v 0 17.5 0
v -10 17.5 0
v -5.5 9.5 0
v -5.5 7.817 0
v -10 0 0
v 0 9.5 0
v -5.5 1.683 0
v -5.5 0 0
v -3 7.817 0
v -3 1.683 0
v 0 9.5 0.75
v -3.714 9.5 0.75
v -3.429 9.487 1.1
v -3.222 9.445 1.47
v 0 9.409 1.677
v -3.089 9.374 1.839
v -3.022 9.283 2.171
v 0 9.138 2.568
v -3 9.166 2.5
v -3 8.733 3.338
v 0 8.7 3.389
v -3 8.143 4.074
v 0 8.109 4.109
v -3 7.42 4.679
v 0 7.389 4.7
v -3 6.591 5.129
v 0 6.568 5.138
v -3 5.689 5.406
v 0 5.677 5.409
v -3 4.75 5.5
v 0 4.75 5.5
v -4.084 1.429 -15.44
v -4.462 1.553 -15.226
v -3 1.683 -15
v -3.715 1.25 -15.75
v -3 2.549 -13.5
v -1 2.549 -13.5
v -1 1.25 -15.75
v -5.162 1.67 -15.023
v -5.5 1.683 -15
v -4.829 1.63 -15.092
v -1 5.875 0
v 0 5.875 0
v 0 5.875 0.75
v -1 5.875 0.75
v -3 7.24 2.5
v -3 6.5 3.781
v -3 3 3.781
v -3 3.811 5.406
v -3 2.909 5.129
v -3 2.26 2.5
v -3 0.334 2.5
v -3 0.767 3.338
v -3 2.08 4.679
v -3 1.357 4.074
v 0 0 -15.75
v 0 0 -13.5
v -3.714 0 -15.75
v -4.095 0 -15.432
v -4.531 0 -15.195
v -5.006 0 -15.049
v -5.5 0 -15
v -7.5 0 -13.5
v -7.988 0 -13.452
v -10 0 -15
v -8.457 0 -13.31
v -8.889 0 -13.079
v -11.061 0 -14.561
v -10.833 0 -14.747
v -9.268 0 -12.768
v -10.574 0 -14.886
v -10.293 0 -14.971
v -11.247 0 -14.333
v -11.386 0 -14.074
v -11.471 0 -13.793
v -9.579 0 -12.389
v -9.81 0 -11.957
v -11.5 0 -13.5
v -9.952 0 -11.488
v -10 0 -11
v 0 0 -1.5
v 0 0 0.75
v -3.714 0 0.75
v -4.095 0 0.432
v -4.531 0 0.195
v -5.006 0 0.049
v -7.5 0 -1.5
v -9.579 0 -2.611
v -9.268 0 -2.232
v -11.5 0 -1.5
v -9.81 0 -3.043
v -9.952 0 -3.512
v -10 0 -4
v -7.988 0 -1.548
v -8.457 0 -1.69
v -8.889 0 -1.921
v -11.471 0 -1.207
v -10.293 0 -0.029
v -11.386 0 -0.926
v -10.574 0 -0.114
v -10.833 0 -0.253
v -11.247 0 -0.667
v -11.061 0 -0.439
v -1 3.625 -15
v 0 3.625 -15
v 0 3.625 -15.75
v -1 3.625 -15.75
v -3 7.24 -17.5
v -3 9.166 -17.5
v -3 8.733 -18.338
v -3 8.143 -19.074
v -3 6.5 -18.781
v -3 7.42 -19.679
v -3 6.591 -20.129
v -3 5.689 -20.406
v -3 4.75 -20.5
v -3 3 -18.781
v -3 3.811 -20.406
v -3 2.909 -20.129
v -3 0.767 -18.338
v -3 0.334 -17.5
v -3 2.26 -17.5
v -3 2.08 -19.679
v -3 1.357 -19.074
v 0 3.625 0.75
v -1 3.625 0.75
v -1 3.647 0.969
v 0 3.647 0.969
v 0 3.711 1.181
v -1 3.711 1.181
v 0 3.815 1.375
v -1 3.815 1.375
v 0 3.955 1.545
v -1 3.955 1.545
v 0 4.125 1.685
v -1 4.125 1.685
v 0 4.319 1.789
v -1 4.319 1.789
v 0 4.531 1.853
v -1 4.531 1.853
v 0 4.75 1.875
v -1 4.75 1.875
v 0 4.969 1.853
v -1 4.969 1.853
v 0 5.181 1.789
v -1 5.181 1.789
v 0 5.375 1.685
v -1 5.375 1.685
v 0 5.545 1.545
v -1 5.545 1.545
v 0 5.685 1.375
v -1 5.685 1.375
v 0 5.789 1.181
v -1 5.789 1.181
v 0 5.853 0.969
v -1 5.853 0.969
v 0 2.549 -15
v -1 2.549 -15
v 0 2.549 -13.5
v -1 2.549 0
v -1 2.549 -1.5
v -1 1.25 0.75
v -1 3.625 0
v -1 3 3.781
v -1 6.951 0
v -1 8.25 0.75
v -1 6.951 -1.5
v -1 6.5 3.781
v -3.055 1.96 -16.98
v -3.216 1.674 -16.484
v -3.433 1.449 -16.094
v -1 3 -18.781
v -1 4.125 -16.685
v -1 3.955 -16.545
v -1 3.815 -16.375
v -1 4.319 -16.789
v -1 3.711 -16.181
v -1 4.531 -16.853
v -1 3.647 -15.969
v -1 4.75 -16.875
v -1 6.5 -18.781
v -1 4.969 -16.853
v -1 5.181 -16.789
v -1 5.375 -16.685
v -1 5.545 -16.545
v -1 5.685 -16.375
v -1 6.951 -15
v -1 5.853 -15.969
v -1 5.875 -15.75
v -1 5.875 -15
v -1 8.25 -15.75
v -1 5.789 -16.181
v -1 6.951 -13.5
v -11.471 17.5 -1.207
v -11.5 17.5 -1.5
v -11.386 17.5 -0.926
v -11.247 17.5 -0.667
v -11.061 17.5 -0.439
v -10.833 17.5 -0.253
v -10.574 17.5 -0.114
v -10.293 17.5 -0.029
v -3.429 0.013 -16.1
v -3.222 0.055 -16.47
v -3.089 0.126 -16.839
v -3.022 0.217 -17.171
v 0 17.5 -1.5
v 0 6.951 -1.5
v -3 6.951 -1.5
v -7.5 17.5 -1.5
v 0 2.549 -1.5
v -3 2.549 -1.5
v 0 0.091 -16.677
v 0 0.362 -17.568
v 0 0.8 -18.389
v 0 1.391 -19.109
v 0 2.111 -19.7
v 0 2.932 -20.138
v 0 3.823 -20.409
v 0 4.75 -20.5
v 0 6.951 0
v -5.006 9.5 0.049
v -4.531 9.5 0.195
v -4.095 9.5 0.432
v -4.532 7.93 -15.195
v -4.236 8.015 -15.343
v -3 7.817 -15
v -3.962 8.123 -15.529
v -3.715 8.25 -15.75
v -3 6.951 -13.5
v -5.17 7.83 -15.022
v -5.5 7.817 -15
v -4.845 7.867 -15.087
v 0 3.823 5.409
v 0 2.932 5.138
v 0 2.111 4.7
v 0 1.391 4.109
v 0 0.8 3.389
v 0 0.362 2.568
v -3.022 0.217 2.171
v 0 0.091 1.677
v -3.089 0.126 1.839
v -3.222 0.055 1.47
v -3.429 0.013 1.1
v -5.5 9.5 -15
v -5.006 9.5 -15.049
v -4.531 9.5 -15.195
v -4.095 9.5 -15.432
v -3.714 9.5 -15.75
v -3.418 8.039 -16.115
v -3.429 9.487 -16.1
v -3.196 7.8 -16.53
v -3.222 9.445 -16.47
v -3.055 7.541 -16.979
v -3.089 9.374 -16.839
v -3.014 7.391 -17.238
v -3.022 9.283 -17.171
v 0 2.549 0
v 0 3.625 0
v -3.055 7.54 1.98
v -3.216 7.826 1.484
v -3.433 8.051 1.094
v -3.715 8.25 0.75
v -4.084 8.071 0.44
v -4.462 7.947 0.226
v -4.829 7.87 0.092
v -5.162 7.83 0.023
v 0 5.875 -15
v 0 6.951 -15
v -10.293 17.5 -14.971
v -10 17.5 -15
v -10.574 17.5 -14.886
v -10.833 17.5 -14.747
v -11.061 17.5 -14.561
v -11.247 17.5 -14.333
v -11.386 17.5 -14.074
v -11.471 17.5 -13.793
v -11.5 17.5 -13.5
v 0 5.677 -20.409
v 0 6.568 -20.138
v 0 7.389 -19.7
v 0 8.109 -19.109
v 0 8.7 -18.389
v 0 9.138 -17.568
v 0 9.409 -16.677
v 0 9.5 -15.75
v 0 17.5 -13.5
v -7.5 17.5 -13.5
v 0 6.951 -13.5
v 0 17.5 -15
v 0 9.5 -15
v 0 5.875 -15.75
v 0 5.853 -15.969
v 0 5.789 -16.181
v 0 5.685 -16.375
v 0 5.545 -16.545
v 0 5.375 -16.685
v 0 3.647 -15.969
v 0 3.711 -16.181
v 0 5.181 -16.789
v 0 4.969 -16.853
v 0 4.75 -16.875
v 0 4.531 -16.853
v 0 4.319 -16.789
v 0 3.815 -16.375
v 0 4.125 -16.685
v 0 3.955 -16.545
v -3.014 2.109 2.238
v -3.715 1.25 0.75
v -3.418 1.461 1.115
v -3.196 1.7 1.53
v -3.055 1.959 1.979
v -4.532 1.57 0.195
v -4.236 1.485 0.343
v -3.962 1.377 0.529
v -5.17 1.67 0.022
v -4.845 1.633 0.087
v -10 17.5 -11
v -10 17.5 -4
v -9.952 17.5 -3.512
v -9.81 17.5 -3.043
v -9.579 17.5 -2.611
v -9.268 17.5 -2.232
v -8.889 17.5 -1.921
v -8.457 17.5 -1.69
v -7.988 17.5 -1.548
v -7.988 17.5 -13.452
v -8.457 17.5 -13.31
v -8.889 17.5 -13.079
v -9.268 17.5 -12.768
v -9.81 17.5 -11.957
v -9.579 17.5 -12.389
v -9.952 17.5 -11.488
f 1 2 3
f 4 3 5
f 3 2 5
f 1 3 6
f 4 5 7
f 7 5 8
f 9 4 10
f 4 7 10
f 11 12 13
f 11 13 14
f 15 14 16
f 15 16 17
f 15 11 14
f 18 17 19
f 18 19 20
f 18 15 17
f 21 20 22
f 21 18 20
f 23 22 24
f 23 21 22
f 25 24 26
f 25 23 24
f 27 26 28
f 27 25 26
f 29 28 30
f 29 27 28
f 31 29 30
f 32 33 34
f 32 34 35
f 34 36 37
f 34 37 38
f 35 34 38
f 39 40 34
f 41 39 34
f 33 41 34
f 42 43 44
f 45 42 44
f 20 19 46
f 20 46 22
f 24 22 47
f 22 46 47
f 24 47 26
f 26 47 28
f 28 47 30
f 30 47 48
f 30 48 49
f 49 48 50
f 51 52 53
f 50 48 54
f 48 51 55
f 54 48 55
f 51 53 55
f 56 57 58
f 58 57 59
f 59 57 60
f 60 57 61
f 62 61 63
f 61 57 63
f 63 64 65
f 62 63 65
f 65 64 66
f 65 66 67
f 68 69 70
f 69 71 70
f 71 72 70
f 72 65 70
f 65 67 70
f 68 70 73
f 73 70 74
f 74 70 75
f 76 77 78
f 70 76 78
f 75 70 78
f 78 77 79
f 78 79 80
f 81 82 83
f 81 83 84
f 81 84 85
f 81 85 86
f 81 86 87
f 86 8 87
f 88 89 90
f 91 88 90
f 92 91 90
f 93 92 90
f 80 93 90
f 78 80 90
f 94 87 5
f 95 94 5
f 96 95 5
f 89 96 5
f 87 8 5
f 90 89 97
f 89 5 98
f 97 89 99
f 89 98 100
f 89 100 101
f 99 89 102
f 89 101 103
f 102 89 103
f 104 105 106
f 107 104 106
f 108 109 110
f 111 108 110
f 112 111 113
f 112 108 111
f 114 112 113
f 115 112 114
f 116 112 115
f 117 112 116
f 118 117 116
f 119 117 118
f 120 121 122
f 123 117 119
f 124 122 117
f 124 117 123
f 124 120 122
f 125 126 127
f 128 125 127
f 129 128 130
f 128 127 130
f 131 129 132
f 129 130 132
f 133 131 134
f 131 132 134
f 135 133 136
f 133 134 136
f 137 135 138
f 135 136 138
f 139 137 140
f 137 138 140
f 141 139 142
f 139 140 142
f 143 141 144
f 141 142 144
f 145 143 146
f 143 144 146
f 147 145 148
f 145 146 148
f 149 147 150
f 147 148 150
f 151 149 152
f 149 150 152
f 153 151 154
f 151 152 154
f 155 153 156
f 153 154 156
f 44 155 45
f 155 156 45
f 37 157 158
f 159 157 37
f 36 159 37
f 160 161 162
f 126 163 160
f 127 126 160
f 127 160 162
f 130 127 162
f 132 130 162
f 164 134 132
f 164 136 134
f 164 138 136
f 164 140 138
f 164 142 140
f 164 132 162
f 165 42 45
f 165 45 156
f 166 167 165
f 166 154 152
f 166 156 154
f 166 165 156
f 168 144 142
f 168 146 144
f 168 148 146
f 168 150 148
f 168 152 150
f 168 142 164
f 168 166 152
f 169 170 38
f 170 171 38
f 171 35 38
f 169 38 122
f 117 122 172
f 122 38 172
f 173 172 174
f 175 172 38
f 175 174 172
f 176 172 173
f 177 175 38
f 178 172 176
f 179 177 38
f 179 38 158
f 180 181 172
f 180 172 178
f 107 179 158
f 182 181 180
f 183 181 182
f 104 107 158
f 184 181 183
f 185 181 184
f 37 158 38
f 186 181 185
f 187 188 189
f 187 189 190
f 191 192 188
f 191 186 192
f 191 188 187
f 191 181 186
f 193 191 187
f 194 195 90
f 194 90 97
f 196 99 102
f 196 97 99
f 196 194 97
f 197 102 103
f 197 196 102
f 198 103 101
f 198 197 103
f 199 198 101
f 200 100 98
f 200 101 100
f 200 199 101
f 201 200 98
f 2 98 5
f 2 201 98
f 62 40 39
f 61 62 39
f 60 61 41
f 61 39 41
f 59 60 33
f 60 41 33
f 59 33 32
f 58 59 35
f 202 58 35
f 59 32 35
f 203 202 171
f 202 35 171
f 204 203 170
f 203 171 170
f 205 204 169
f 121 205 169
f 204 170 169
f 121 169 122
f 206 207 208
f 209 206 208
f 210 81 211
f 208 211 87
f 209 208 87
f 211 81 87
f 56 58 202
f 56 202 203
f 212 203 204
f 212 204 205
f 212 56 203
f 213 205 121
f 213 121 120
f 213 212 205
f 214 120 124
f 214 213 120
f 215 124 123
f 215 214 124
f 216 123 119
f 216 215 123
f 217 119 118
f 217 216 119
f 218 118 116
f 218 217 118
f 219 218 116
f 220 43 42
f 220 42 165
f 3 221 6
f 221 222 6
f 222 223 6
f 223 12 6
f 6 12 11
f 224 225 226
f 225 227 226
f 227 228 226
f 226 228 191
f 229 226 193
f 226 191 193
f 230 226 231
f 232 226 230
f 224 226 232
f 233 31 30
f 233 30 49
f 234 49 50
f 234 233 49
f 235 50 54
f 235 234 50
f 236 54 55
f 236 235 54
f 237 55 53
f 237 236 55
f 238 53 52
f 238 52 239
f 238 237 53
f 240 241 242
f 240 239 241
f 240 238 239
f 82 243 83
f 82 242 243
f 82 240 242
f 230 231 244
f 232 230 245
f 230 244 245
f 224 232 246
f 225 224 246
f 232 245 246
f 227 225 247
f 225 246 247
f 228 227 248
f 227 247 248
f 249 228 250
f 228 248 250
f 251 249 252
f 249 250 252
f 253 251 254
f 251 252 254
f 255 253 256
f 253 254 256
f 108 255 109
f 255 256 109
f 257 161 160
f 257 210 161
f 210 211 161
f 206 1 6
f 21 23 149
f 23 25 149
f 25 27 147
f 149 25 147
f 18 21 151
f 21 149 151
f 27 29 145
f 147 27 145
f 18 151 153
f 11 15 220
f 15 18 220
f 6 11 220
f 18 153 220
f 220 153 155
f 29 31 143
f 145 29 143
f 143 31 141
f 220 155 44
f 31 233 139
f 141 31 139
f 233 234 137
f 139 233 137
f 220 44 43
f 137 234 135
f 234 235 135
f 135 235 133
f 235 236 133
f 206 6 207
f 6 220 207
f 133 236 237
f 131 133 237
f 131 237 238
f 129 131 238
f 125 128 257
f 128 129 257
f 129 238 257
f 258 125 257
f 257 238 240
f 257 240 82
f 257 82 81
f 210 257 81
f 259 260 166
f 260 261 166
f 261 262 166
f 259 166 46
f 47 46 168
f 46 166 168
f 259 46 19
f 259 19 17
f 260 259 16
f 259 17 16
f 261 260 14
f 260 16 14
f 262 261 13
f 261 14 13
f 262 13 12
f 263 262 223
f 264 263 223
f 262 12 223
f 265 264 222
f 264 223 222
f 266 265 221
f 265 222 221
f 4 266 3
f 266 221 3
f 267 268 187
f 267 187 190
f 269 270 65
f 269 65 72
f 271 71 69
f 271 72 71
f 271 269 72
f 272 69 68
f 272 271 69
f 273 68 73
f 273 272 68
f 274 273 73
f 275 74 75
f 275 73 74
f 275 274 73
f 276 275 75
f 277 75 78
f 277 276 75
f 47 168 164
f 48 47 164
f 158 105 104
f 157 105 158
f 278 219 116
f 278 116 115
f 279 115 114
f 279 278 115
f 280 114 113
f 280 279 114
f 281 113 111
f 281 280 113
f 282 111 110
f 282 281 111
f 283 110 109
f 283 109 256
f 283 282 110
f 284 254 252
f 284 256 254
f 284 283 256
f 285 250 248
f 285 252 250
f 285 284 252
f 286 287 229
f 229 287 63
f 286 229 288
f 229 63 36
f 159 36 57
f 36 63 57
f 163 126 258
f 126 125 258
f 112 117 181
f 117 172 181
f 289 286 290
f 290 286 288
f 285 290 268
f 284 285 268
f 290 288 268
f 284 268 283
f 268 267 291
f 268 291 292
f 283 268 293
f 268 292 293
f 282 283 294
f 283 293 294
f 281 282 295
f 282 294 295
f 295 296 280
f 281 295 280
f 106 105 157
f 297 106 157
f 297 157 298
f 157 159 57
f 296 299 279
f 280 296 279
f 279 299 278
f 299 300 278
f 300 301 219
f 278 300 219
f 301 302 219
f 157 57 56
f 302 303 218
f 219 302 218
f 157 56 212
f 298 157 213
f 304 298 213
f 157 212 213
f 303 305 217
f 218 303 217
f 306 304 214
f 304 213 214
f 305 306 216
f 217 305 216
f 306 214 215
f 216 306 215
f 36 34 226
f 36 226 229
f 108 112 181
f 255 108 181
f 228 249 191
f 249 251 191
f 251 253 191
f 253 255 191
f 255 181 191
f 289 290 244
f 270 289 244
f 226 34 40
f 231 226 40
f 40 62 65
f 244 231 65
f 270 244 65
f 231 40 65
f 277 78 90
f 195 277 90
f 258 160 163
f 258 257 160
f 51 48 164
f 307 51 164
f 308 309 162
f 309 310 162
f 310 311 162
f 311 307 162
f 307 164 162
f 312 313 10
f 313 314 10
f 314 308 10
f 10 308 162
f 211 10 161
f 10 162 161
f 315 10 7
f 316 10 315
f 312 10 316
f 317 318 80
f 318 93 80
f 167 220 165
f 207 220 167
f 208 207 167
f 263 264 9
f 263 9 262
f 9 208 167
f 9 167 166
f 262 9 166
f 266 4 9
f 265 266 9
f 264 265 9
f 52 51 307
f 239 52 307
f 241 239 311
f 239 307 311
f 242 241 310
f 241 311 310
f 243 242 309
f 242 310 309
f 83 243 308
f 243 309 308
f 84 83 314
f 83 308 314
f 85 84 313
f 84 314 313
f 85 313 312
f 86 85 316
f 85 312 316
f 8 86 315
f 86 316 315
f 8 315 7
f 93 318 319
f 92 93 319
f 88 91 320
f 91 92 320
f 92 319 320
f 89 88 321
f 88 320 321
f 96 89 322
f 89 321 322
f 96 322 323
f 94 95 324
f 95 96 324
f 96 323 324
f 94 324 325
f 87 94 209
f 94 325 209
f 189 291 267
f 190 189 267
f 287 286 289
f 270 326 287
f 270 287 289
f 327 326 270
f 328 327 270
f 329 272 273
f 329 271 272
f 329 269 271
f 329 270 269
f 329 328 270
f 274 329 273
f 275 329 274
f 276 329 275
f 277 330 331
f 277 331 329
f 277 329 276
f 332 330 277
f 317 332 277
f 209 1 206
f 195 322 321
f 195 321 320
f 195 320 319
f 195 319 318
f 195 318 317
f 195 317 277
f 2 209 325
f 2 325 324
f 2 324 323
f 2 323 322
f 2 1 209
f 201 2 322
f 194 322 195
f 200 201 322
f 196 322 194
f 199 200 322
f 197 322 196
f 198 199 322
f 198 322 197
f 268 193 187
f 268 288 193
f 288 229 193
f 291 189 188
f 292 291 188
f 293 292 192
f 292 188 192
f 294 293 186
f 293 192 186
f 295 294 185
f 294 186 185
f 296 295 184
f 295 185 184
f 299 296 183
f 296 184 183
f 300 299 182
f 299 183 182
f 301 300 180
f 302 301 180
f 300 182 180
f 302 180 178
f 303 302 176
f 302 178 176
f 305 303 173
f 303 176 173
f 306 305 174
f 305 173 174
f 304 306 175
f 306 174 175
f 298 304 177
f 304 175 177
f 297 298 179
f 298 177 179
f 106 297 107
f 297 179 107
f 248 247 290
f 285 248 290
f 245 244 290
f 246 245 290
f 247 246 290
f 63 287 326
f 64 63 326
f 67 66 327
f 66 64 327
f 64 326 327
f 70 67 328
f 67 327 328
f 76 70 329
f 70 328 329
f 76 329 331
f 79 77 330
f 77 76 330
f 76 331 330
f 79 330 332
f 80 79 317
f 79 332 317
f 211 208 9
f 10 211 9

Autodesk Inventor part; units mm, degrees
ref_plane "YZ Plane" through (0, 0, 0) normal (1, 0, 0) x (0, 1, 0)
ref_plane "XZ Plane" through (0, 0, 0) normal (0, 1, 0) x (-1, 0, 0)
ref_plane "XY Plane" through (0, 0, 0) normal (0, 0, 1) x (1, 0, 0)
sketch "Sketch1" plane through (0, 0, 0) normal (0, 1, 0) x (-1, 0, 0)
  line L0 (0, 0) -> (0, -1.5)
  line L1 (0, -1.5) -> (10, -1.5)
  line L2 (10, -1.5) -> (10, -13.5)
  line L3 (10, -13.5) -> (0, -13.5)
  line L4 (0, -13.5) -> (0, -15)
  line L5 (0, -15) -> (11.5, -15)
  line L6 (11.5, -15) -> (11.5, 0)
  line L7 (11.5, 0) -> (0, 0)
  dimension "d0" = 1.5
  dimension "d1" = 1.5
  dimension "d2" = 1.5
  dimension "d3" = 10
  dimension "d4" = 12
extrude "Extrusion1" add sketch "Sketch1" along normal blind 17.5
fillet "Fillet1" radius 1.5 2 edges at (-11.5, 8.75, 0) (-11.5, 8.75, -15)
fillet "Fillet2" radius 2.5 2 edges at (-10, 8.75, -13.5) (-10, 8.75, -1.5)
sketch "Sketch2" plane through (0, 0, 0) normal (0, -1, 0) x (1, 0, 0)
  line L0 (0, 0) -> (-3, 0)
  line L1 (-3, 0) -> (-3, 5.5)
  line L2 (-3, 5.5) -> (0, 5.5)
  line L3 (0, 5.5) -> (0, 0)
  line L4 (0, -15) -> (-10, -15) projected
  line L5 (0, -15) -> (-3, -15)
  line L6 (-3, -15) -> (-3, -20.5)
  line L7 (-3, -20.5) -> (0, -20.5)
  line L8 (0, -20.5) -> (0, -15)
  dimension "d9" = 3
  dimension "d10" = 5.5
extrude "Extrusion2" add sketch "Sketch2" against normal blind 9.5
fillet "Fillet3" radius 4.75 4 edges at (-1.5, 0, 5.5) (-1.5, 9.5, 5.5) (-1.5, 0, -20.5) (-1.5, 9.5, -20.5)
fillet "Fillet4" radius 2.5 2 edges at (-3, 4.75, -15) (-3, 4.75, 0)
sketch "Sketch3" plane through (-3, 4.75, -15.75) normal (-1, 0, 0) x (0, 0, 1)
  arc A0 (0, 4.75) -> (0, -4.75) centre (0, 0) ccw projected
  circle A1 centre (0, 0) radius 3.5
  line L0 (-3.0311, -1.75) -> (-3.0311, 1.75)
  line L1 (-3.0311, 1.75) -> (0, 3.5)
  line L2 (0, 3.5) -> (3.0311, 1.75)
  line L3 (3.0311, 1.75) -> (3.0311, -1.75)
  line L4 (3.0311, -1.75) -> (0, -3.5)
  line L5 (0, -3.5) -> (-3.0311, -1.75)
  line L6 (2.25, -4.75) -> (2.25, 12.75) projected
  circle A2 centre (0, 0) radius 1.125
  line L7 (0.75, -4.75) -> (0.75, 4.75) projected
  line L8 (0.75, 3.067) -> (0.75, -3.067)
  arc A3 (18.25, -4.4159) -> (18.25, 4.4159) centre (16.5, 0) ccw projected
  line L9 (19.5311, 1.75) -> (19.5311, -1.75)
  line L10 (19.5311, -1.75) -> (16.5, -3.5)
  line L11 (16.5, -3.5) -> (13.4689, -1.75)
  line L12 (13.4689, -1.75) -> (13.4689, 1.75)
  line L13 (13.4689, 1.75) -> (16.5, 3.5)
  line L14 (16.5, 3.5) -> (19.5311, 1.75)
  line L15 (14.25, 12.75) -> (14.25, -4.75) projected
  line L16 (15.75, -4.75) -> (15.75, 12.75) projected
  line L17 (15.75, -3.067) -> (15.75, 3.067)
  circle A4 centre (16.5, 0) radius 1.125
  point P0 (2.25, -2.201)
  point P1 (2.25, 2.201)
  point P2 (0.75, 0.8385)
  point P3 (0.75, -0.8385)
  point P4 (15.75, 0.8385)
  point P5 (15.75, -0.8385)
  point P6 (14.25, 2.201)
  point P7 (14.25, -2.201)
  dimension "d15" = 3.5
  dimension "d16" = 2.25
  dimension "d25" = 2.25
extrude "Extrusion3" cut sketch "Sketch3" along normal blind 10 and the other way blind 2 contours L7 A2 L4 L5 L0 L1 L2 | L7 A2 | L9 L10 L11 L16 A4 L13 L14 | A4 L16 picked at (0.2626, -0.3643) picked at (16.8752, 0.2073)
extrude "Extrusion4" cut sketch "Sketch3" against normal through all contours L7 A2 | A2 L7 | A4 L16 | L16 A4
extrude "Extrusion5" cut sketch "Sketch3" against normal up to surface (2 mm away) contours L6 L4 L7 A2 L2 | L16 A4 L11 L15 L13
sketch "Sketch4" plane through (0, 0, -13.5) normal (1, 0, 0) x (0, 0, -1)
  circle A0 centre (2.25, 4.75) radius 1.125 projected
  line L0 (2.25, 5.875) -> (-14.25, 5.875)
  line L1 (-14.25, 5.875) -> (-14.25, 3.625)
  line L2 (-14.25, 3.625) -> (2.25, 3.625)
  line L3 (2.25, 3.625) -> (2.25, 5.875)
  circle A1 centre (-14.25, 4.75) radius 1.125 projected
  point P0 (-13.5, 0)
  point P1 (2.25, 3.625)
extrude "Extrusion6" cut sketch "Sketch4" against normal up to surface (1 mm away) contours A0 L2 A1 L0
sketch "Sketch5" plane through (0, 17.5, 0) normal (1, 0, 0) x (0, 0, -1)
  line L0 (0, -17.5) -> (0, 0) projected
  line L1 (15, -9.683) -> (15, -15.817) projected
  line L2 (0, -10.549) -> (15, -10.549)
  line L3 (15, -10.549) -> (15, -14.951)
  line L4 (15, -14.951) -> (0, -14.951)
  line L5 (0, -14.951) -> (0, -10.549)
  point P0 (13.5, -14.951)
  point P1 (1.5, -10.549)
  point P2 (0, -14.951)
extrude "Extrusion7" cut sketch "Sketch5" against normal up to surface (3 mm away)
properties part number "Pololu_MicroMotorMount"
